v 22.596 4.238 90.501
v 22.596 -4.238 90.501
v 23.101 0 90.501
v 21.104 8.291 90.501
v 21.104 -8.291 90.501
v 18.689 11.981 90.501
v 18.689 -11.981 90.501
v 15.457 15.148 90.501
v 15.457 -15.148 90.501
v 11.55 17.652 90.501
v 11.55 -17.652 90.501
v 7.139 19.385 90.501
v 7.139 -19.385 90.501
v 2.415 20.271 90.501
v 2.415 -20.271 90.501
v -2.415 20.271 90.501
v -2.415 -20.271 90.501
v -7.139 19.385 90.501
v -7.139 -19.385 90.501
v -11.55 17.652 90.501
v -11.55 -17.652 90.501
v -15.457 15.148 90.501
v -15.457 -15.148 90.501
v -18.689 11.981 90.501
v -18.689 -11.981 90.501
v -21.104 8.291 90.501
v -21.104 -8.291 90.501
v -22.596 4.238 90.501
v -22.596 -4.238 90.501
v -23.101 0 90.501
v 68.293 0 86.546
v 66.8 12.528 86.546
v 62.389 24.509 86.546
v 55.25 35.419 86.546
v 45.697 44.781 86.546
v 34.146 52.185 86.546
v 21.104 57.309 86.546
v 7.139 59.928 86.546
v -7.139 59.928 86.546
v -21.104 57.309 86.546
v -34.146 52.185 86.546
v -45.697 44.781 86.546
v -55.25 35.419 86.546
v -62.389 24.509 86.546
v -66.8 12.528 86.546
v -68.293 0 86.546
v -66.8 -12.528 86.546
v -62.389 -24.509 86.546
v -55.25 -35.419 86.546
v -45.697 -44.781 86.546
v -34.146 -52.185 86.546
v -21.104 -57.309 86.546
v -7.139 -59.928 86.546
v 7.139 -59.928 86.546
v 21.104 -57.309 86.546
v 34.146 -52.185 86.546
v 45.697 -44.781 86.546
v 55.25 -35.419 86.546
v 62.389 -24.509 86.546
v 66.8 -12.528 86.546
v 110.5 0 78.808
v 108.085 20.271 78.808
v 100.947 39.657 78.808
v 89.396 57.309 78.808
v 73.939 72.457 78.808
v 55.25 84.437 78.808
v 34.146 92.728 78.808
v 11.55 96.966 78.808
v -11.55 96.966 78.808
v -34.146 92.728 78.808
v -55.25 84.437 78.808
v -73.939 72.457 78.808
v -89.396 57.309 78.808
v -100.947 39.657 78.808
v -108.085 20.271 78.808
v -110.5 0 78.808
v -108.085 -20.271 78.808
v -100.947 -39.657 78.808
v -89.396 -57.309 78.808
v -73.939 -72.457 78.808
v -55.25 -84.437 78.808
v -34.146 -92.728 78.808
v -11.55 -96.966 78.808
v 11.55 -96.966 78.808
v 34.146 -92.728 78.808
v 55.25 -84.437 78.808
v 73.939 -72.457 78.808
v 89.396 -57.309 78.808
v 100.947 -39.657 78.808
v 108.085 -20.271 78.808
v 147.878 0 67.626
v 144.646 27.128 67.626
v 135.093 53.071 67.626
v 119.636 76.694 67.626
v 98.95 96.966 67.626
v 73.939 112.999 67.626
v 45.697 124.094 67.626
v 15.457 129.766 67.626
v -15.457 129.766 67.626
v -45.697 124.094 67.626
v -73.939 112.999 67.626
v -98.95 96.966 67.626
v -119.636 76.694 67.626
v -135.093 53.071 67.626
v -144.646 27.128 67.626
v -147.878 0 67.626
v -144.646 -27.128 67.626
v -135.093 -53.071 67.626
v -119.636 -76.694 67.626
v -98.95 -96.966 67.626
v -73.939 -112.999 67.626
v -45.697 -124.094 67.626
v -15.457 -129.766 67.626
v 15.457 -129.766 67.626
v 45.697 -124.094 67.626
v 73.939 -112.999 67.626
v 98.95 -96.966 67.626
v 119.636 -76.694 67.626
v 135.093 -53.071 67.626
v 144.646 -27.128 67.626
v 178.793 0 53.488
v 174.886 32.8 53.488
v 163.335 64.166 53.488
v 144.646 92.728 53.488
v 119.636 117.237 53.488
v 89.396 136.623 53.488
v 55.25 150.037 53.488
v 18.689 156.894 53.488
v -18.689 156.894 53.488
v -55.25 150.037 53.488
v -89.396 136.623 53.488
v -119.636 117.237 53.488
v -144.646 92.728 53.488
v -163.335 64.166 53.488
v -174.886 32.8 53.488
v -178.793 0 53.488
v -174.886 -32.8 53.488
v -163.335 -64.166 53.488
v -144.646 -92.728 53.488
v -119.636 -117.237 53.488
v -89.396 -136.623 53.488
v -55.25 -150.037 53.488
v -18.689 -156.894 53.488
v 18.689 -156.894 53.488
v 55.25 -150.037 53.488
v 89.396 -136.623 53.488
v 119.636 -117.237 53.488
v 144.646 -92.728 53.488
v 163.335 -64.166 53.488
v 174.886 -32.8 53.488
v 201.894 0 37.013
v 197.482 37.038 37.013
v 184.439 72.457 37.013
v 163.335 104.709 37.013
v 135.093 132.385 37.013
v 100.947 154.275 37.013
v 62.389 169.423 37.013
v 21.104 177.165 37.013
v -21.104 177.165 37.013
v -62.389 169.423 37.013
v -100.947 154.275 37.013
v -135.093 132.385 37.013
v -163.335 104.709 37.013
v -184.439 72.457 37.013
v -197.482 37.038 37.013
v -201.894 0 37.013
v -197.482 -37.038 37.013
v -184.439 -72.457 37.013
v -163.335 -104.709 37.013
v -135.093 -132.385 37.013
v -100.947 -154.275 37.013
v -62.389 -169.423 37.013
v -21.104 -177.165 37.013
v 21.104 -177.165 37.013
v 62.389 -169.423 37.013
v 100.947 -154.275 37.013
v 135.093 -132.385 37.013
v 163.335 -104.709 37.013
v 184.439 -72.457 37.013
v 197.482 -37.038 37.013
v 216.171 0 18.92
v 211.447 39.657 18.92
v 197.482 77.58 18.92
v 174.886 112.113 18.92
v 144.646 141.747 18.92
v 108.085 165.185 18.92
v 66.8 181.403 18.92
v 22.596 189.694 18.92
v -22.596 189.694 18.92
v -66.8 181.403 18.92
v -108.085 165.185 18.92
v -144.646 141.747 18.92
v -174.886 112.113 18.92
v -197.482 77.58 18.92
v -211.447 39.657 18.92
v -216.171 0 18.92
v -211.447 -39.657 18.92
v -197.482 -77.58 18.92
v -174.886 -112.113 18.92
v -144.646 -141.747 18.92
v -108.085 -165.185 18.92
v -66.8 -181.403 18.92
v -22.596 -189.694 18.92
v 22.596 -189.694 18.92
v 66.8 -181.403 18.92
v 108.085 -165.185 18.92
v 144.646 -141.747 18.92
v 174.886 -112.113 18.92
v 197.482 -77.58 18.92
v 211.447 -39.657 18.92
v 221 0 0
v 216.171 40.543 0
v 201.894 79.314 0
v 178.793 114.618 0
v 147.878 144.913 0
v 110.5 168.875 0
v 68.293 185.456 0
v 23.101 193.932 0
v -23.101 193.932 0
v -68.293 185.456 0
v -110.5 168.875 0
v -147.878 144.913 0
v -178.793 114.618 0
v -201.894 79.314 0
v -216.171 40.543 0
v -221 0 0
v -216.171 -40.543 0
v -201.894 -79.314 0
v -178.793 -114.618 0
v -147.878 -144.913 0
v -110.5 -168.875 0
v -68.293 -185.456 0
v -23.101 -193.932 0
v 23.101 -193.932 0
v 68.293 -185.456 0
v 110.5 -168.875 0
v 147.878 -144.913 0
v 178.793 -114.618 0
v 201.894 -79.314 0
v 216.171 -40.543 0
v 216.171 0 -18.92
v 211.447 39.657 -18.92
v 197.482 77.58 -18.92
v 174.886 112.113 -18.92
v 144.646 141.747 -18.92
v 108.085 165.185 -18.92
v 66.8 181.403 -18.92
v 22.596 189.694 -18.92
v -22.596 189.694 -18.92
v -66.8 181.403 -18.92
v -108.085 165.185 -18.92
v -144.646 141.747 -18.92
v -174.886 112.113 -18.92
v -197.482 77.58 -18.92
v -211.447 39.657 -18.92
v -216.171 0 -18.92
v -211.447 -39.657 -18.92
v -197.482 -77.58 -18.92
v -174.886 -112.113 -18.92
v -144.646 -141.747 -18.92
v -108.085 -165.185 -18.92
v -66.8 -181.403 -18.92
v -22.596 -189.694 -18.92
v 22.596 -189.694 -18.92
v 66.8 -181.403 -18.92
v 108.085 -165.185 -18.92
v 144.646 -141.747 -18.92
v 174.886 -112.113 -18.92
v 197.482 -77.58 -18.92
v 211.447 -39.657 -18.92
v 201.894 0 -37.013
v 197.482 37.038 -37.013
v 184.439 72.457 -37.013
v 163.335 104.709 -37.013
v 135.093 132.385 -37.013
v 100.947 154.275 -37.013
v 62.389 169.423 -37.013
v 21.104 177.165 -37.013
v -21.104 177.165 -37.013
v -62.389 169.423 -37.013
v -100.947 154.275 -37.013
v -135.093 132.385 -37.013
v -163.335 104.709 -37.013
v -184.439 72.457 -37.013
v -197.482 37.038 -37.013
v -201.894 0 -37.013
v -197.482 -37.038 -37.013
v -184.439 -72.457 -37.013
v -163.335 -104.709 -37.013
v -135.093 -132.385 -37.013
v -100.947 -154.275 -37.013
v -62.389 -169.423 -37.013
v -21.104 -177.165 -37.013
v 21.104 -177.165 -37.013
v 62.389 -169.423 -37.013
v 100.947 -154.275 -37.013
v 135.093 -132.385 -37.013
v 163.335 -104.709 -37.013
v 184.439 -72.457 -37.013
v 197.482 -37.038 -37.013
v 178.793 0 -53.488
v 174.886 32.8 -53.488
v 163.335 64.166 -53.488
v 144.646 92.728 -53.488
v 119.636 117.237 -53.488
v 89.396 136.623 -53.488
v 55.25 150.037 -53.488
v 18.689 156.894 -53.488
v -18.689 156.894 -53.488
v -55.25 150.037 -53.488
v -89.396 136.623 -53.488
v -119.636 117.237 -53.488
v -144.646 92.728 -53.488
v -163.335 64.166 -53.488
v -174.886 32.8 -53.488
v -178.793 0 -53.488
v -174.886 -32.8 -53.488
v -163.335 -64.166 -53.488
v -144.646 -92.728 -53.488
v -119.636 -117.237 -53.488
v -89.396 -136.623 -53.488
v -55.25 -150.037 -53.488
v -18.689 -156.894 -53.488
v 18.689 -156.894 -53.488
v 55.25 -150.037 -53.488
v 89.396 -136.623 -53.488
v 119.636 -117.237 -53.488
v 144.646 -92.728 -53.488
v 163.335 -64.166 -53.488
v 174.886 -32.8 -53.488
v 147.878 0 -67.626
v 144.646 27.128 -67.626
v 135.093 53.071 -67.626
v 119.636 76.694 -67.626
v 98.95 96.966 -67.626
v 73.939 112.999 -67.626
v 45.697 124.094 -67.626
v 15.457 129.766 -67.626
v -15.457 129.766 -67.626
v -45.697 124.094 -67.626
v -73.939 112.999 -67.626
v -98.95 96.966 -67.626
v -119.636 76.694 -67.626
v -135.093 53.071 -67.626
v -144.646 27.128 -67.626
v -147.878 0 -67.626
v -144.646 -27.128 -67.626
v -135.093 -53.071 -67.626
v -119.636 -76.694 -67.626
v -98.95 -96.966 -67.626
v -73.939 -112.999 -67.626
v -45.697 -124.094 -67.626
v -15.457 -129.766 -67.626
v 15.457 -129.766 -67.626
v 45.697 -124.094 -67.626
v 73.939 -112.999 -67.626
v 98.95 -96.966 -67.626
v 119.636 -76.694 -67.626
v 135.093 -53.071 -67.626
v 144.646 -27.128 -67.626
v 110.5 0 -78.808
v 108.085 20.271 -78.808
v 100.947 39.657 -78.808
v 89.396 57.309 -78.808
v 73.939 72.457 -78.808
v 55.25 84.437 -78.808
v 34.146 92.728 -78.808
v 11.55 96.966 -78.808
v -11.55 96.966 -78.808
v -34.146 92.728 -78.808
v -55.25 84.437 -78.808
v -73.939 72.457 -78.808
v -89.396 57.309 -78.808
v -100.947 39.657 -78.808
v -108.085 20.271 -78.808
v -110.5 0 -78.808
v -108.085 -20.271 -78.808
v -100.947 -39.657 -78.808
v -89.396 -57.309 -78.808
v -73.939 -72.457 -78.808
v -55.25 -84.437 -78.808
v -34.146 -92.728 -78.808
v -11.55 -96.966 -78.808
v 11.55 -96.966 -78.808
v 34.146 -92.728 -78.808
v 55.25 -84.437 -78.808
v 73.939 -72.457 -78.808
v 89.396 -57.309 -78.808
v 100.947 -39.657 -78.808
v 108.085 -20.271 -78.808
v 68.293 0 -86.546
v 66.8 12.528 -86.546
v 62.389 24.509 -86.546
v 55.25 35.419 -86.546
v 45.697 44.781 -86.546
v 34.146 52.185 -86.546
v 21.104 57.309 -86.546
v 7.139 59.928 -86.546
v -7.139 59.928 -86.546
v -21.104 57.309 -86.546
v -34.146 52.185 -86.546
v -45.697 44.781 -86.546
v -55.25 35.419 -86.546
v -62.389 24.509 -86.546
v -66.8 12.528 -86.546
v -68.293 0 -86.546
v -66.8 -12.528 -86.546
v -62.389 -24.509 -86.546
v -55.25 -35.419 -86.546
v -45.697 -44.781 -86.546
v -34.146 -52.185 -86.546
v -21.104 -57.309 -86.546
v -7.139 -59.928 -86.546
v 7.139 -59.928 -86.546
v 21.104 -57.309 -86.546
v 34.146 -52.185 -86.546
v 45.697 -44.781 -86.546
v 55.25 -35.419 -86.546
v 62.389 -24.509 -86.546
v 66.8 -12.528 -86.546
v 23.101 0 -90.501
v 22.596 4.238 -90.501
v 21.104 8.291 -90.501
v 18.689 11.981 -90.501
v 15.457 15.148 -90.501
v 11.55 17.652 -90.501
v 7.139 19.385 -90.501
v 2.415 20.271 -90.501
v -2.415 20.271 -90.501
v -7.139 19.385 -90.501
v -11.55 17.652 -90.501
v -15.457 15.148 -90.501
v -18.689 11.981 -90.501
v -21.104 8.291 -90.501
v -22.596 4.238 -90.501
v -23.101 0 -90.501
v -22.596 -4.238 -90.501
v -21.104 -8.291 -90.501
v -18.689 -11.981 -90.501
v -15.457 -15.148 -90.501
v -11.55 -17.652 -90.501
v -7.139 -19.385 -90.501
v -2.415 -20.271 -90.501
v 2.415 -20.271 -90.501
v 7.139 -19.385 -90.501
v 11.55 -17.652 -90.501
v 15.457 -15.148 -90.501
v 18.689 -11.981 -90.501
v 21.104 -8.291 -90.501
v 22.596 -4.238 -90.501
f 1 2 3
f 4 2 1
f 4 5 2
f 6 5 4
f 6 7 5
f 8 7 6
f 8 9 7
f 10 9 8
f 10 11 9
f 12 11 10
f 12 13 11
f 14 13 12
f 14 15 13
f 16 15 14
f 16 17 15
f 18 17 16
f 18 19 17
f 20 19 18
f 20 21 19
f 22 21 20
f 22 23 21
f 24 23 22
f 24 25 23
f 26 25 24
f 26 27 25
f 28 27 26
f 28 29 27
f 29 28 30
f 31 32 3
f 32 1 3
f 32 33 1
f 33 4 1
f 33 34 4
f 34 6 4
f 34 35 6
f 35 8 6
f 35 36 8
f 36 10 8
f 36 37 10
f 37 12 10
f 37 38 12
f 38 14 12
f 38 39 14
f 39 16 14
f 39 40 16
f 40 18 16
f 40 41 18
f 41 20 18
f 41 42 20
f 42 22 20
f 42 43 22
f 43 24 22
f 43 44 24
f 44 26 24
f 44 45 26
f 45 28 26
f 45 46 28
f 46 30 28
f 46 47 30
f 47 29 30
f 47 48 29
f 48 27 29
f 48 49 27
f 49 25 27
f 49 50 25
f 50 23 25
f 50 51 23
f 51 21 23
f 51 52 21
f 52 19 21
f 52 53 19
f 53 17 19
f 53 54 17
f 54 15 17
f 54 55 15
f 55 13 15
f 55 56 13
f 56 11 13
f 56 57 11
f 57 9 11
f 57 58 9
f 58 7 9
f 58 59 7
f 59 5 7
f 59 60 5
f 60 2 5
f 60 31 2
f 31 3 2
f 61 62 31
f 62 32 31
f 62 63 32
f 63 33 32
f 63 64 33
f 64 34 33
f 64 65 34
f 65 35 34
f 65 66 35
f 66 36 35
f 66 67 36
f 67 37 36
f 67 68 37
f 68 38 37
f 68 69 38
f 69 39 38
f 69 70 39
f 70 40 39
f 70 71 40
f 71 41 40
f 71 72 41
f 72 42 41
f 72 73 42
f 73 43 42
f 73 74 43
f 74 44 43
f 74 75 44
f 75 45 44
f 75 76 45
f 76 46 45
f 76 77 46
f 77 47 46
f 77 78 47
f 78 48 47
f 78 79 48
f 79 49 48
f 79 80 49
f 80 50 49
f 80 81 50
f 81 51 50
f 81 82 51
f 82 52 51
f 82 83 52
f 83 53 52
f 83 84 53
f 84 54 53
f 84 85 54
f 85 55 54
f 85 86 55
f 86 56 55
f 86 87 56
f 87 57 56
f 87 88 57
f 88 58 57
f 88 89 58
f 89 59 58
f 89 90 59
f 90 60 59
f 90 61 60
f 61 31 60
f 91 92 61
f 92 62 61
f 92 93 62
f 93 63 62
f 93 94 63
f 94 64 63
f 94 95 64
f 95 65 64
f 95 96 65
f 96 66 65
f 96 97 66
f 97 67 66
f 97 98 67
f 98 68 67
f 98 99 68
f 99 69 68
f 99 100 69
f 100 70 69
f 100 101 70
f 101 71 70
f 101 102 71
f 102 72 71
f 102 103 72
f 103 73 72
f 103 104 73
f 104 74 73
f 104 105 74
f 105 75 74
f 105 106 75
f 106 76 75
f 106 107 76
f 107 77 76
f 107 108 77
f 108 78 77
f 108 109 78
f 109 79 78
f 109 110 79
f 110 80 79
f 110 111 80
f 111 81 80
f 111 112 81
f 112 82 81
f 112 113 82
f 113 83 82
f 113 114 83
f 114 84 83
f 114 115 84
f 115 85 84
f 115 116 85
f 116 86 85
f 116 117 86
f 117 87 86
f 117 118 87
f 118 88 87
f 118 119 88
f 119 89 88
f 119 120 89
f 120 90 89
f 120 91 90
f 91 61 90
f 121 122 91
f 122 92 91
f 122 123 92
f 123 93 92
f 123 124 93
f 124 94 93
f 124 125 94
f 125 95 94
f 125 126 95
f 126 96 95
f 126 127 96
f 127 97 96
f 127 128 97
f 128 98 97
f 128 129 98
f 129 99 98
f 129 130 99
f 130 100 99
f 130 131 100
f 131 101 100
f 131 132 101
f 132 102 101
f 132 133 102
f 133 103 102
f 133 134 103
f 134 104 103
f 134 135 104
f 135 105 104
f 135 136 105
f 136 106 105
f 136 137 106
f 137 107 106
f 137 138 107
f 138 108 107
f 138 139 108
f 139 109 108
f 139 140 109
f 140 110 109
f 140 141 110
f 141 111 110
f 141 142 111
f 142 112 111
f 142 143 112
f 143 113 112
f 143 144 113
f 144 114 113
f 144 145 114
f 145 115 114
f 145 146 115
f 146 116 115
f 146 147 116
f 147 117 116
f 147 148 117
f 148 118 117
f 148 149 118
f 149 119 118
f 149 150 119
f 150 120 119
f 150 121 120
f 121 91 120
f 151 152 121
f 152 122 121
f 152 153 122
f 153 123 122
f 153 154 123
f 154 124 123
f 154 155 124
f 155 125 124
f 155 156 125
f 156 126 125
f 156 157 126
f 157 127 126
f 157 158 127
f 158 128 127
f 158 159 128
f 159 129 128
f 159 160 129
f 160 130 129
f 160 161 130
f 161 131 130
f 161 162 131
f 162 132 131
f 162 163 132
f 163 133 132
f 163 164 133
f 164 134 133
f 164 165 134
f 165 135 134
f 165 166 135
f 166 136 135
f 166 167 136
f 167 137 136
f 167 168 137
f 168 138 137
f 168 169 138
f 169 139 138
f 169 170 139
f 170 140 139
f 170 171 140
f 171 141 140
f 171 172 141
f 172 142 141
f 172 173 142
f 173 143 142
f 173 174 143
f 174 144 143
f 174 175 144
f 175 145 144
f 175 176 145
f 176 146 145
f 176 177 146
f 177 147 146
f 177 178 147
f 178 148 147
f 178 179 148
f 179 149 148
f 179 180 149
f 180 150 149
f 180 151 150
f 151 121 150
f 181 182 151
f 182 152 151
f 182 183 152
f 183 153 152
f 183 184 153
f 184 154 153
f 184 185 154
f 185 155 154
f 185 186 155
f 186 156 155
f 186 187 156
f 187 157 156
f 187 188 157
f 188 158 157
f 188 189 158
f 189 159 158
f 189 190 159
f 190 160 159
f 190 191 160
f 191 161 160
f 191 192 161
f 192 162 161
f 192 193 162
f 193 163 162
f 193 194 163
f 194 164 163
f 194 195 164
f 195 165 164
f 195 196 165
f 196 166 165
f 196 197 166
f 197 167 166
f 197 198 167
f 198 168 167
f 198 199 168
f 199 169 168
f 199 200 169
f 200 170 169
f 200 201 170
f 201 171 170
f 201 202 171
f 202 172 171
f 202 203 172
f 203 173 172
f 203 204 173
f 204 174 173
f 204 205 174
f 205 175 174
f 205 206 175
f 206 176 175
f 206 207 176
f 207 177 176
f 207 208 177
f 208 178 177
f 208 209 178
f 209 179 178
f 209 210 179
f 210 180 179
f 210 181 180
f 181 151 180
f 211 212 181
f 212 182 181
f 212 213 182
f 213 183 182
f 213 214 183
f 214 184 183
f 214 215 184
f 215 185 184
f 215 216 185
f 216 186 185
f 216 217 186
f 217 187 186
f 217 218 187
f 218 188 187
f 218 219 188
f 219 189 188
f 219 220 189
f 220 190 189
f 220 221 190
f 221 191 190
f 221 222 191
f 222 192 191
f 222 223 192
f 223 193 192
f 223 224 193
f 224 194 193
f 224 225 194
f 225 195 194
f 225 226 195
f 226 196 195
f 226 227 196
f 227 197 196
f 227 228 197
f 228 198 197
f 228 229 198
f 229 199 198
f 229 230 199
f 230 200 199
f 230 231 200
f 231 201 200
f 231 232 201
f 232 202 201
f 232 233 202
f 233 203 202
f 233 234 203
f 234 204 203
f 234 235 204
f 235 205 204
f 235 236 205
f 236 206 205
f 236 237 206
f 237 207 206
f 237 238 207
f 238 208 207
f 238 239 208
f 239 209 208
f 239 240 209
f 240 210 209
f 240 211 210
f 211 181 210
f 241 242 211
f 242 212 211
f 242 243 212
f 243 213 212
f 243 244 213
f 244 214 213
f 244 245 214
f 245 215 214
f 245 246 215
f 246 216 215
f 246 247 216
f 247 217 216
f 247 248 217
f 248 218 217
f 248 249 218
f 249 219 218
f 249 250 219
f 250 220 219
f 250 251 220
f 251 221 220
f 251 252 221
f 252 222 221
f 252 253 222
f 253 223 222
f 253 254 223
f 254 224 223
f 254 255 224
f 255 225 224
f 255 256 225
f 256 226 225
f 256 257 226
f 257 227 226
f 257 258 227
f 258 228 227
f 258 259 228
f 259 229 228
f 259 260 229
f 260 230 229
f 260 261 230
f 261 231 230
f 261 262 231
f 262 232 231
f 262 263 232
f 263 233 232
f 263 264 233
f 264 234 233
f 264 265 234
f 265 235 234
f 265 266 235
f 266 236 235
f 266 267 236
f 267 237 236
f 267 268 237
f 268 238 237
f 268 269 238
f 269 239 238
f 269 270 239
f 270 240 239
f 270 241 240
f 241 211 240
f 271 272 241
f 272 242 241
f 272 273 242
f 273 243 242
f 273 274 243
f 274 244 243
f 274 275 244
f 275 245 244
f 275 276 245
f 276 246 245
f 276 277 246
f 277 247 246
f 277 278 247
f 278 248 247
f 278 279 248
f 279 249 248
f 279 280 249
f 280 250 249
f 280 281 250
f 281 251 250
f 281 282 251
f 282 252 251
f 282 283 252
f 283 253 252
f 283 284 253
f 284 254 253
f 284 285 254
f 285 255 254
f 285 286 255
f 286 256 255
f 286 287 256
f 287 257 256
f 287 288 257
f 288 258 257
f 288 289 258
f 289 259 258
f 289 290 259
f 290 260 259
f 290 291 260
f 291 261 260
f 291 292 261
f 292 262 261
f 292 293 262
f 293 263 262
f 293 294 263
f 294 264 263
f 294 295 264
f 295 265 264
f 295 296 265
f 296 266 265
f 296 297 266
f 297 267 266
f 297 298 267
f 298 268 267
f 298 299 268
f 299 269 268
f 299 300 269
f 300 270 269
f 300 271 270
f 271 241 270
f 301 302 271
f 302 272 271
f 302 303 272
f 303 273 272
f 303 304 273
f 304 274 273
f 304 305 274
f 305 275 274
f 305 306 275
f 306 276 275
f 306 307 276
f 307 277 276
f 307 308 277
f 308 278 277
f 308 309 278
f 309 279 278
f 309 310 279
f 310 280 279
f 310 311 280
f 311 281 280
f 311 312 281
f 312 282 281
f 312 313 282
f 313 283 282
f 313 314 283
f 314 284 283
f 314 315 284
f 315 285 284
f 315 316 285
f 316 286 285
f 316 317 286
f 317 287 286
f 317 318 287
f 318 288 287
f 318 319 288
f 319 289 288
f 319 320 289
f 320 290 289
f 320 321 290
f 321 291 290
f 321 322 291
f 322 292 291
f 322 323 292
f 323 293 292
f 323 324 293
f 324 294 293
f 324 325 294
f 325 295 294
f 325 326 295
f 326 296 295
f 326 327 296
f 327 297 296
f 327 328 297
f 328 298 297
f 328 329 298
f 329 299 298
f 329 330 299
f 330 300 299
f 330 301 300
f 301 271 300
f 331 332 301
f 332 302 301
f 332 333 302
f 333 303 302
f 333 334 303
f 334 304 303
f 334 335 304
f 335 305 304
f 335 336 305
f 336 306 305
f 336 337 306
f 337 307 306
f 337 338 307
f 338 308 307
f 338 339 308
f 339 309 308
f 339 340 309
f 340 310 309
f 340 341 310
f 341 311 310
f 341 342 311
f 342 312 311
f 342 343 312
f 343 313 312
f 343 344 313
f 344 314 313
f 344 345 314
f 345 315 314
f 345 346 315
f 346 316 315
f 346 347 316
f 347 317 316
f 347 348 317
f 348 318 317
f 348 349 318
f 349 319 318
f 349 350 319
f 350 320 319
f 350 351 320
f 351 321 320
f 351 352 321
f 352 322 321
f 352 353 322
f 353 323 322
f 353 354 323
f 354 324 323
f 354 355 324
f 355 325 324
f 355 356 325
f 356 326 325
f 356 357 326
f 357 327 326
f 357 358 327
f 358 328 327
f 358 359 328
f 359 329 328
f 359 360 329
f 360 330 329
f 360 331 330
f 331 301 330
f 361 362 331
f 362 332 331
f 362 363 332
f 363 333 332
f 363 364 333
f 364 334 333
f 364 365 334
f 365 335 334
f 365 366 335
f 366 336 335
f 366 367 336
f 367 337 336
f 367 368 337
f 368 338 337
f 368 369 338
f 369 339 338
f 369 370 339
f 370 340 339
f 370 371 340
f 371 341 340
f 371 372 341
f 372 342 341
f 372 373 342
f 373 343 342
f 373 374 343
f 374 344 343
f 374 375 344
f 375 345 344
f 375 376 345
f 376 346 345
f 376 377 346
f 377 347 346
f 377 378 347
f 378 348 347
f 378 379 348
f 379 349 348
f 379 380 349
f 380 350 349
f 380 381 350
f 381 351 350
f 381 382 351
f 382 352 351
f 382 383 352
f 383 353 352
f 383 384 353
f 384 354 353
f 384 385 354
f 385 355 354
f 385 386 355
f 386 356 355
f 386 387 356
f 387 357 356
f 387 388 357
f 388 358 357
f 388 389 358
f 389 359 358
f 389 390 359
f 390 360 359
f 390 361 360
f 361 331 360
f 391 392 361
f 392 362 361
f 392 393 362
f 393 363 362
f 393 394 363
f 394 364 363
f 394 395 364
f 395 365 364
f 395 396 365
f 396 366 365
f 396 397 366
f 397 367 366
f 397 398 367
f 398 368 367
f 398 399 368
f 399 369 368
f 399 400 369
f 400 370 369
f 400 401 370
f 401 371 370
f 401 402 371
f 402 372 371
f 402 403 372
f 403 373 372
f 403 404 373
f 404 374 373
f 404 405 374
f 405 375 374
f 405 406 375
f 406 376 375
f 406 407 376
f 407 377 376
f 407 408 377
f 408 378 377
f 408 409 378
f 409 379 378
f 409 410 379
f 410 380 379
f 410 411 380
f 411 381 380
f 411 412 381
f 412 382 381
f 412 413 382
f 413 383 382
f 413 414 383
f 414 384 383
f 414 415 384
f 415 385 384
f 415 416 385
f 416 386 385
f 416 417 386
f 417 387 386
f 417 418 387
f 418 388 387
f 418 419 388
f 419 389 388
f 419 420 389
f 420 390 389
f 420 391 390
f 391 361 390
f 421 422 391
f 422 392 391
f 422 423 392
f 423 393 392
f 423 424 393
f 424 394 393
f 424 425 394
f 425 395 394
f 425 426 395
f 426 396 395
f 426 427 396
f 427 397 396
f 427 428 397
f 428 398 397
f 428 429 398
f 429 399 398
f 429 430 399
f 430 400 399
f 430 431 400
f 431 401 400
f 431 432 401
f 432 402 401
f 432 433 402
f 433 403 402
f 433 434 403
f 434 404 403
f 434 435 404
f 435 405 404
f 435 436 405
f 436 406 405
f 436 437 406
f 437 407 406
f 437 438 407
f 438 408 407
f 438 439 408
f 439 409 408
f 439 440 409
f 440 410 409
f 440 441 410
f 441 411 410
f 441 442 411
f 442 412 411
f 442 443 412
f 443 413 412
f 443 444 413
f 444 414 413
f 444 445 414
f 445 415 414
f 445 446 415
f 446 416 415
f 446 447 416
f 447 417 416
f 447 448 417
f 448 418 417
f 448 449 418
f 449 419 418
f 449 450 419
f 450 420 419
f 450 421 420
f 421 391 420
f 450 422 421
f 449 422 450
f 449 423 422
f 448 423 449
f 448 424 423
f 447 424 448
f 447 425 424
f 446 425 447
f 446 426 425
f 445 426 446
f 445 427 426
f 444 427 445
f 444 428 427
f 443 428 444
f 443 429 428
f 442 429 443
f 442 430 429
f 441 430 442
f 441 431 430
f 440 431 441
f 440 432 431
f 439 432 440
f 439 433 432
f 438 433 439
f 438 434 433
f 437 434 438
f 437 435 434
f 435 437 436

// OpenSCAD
// Generated by SolidPython 1.0.1 on 2020-07-29 00:46:53


scale(v = [17, 15, 7]) {
	sphere(r = 13);
}
/***********************************************
*********      SolidPython code:      **********
************************************************
 
# import packages: SolidPython
from solid import *
from solid.utils import *
from itertools import chain, combinations, permutations


class Resize:

    def __init__(self, scad_file):
        self.scad_file = scad_file
        #self.scad_file = import_scad(scad_file)
        # cone/cylinder param:
        self.r1 = 0
        self.r2 = 0
        self.h = 0
        # rectangular prism param:
        self.w = 0
        self.l = 0
        # ellipse param:
        self.r = 0

    # import OpenScad code (file name corresponds to shape)


    # classify shape + parameters
    def assign(self, param1, param2, param3):
        if self.scad_file == 'cone.scad':
            self.r1 = param1
            self.r2 = param2
            self.h = param3
        elif self.scad_file == 'cylinder.scad':
            self.r1 = param1
            self.r2 = param2
            self.h = param3
        elif self.scad_file == 'rectangularPrism.scad':
            self.h = param1
            self.l = param2
            self.w = param3
        else:
            self.r = param1
            self.h = param2

    # resize parameters
    def iterate(self):
        x = range(3, 20, 2)
        i = 1
        if self.scad_file == 'cone.scad':
            tempList = list(permutations(x, 2))
            for temp in tempList:
                param1 = temp[0]
                param2 = temp[1]
                filepath = 'produced_scad_files/' + 'cone' + str(param1) + '_' + str(param2) + '_' + '.scad'
                scad_render_to_file(cylinder(h=param1, r1=param2, r2=0), filepath)

        elif self.scad_file == 'cylinder.scad':
            tempList = list(permutations(x, 3))
            for temp in tempList:
                param1 = temp[0]
                param2 = temp[1]
                filepath = 'produced_scad_files/' + 'cylinder' + str(param1) + '_' + str(param2) + '_' + '.scad'
                scad_render_to_file(cylinder(h=param1, r1=param2, r2=param2), filepath)

        elif self.scad_file == 'rectangularPrism.scad':
            tempList = list(permutations(x, 3))
            for temp in tempList:
                param1 = temp[0]
                param2 = temp[1]
                param3 = temp[2]
                filepath = 'produced_scad_files/' + 'rectangularPrism' + str(param1) + '_' + str(param2) + '_' + str(
                    param3) + '.scad'
                scad_render_to_file(cube(size=(param1, param2, param3)), filepath)

        elif self.scad_file == 'ellipse.scad':
            tempList = list(permutations(x, 4))
            for temp in tempList:
                param1 = temp[0]
                param2 = temp[1]
                param3 = temp[2]
                param4 = temp[3]
                filepath = 'produced_scad_files/' + 'ellipse' + str(param1) + '_' + str(param2) + '_' + str(param3) + '_' + str(param4) + '.scad'
                scad_render_to_file(scale([param1, param2, param3])(sphere(r=param4)), filepath)

    def render_to_scadfile(self):
        scad_render_to_file(scad, 'example.scad') 
 
************************************************/
